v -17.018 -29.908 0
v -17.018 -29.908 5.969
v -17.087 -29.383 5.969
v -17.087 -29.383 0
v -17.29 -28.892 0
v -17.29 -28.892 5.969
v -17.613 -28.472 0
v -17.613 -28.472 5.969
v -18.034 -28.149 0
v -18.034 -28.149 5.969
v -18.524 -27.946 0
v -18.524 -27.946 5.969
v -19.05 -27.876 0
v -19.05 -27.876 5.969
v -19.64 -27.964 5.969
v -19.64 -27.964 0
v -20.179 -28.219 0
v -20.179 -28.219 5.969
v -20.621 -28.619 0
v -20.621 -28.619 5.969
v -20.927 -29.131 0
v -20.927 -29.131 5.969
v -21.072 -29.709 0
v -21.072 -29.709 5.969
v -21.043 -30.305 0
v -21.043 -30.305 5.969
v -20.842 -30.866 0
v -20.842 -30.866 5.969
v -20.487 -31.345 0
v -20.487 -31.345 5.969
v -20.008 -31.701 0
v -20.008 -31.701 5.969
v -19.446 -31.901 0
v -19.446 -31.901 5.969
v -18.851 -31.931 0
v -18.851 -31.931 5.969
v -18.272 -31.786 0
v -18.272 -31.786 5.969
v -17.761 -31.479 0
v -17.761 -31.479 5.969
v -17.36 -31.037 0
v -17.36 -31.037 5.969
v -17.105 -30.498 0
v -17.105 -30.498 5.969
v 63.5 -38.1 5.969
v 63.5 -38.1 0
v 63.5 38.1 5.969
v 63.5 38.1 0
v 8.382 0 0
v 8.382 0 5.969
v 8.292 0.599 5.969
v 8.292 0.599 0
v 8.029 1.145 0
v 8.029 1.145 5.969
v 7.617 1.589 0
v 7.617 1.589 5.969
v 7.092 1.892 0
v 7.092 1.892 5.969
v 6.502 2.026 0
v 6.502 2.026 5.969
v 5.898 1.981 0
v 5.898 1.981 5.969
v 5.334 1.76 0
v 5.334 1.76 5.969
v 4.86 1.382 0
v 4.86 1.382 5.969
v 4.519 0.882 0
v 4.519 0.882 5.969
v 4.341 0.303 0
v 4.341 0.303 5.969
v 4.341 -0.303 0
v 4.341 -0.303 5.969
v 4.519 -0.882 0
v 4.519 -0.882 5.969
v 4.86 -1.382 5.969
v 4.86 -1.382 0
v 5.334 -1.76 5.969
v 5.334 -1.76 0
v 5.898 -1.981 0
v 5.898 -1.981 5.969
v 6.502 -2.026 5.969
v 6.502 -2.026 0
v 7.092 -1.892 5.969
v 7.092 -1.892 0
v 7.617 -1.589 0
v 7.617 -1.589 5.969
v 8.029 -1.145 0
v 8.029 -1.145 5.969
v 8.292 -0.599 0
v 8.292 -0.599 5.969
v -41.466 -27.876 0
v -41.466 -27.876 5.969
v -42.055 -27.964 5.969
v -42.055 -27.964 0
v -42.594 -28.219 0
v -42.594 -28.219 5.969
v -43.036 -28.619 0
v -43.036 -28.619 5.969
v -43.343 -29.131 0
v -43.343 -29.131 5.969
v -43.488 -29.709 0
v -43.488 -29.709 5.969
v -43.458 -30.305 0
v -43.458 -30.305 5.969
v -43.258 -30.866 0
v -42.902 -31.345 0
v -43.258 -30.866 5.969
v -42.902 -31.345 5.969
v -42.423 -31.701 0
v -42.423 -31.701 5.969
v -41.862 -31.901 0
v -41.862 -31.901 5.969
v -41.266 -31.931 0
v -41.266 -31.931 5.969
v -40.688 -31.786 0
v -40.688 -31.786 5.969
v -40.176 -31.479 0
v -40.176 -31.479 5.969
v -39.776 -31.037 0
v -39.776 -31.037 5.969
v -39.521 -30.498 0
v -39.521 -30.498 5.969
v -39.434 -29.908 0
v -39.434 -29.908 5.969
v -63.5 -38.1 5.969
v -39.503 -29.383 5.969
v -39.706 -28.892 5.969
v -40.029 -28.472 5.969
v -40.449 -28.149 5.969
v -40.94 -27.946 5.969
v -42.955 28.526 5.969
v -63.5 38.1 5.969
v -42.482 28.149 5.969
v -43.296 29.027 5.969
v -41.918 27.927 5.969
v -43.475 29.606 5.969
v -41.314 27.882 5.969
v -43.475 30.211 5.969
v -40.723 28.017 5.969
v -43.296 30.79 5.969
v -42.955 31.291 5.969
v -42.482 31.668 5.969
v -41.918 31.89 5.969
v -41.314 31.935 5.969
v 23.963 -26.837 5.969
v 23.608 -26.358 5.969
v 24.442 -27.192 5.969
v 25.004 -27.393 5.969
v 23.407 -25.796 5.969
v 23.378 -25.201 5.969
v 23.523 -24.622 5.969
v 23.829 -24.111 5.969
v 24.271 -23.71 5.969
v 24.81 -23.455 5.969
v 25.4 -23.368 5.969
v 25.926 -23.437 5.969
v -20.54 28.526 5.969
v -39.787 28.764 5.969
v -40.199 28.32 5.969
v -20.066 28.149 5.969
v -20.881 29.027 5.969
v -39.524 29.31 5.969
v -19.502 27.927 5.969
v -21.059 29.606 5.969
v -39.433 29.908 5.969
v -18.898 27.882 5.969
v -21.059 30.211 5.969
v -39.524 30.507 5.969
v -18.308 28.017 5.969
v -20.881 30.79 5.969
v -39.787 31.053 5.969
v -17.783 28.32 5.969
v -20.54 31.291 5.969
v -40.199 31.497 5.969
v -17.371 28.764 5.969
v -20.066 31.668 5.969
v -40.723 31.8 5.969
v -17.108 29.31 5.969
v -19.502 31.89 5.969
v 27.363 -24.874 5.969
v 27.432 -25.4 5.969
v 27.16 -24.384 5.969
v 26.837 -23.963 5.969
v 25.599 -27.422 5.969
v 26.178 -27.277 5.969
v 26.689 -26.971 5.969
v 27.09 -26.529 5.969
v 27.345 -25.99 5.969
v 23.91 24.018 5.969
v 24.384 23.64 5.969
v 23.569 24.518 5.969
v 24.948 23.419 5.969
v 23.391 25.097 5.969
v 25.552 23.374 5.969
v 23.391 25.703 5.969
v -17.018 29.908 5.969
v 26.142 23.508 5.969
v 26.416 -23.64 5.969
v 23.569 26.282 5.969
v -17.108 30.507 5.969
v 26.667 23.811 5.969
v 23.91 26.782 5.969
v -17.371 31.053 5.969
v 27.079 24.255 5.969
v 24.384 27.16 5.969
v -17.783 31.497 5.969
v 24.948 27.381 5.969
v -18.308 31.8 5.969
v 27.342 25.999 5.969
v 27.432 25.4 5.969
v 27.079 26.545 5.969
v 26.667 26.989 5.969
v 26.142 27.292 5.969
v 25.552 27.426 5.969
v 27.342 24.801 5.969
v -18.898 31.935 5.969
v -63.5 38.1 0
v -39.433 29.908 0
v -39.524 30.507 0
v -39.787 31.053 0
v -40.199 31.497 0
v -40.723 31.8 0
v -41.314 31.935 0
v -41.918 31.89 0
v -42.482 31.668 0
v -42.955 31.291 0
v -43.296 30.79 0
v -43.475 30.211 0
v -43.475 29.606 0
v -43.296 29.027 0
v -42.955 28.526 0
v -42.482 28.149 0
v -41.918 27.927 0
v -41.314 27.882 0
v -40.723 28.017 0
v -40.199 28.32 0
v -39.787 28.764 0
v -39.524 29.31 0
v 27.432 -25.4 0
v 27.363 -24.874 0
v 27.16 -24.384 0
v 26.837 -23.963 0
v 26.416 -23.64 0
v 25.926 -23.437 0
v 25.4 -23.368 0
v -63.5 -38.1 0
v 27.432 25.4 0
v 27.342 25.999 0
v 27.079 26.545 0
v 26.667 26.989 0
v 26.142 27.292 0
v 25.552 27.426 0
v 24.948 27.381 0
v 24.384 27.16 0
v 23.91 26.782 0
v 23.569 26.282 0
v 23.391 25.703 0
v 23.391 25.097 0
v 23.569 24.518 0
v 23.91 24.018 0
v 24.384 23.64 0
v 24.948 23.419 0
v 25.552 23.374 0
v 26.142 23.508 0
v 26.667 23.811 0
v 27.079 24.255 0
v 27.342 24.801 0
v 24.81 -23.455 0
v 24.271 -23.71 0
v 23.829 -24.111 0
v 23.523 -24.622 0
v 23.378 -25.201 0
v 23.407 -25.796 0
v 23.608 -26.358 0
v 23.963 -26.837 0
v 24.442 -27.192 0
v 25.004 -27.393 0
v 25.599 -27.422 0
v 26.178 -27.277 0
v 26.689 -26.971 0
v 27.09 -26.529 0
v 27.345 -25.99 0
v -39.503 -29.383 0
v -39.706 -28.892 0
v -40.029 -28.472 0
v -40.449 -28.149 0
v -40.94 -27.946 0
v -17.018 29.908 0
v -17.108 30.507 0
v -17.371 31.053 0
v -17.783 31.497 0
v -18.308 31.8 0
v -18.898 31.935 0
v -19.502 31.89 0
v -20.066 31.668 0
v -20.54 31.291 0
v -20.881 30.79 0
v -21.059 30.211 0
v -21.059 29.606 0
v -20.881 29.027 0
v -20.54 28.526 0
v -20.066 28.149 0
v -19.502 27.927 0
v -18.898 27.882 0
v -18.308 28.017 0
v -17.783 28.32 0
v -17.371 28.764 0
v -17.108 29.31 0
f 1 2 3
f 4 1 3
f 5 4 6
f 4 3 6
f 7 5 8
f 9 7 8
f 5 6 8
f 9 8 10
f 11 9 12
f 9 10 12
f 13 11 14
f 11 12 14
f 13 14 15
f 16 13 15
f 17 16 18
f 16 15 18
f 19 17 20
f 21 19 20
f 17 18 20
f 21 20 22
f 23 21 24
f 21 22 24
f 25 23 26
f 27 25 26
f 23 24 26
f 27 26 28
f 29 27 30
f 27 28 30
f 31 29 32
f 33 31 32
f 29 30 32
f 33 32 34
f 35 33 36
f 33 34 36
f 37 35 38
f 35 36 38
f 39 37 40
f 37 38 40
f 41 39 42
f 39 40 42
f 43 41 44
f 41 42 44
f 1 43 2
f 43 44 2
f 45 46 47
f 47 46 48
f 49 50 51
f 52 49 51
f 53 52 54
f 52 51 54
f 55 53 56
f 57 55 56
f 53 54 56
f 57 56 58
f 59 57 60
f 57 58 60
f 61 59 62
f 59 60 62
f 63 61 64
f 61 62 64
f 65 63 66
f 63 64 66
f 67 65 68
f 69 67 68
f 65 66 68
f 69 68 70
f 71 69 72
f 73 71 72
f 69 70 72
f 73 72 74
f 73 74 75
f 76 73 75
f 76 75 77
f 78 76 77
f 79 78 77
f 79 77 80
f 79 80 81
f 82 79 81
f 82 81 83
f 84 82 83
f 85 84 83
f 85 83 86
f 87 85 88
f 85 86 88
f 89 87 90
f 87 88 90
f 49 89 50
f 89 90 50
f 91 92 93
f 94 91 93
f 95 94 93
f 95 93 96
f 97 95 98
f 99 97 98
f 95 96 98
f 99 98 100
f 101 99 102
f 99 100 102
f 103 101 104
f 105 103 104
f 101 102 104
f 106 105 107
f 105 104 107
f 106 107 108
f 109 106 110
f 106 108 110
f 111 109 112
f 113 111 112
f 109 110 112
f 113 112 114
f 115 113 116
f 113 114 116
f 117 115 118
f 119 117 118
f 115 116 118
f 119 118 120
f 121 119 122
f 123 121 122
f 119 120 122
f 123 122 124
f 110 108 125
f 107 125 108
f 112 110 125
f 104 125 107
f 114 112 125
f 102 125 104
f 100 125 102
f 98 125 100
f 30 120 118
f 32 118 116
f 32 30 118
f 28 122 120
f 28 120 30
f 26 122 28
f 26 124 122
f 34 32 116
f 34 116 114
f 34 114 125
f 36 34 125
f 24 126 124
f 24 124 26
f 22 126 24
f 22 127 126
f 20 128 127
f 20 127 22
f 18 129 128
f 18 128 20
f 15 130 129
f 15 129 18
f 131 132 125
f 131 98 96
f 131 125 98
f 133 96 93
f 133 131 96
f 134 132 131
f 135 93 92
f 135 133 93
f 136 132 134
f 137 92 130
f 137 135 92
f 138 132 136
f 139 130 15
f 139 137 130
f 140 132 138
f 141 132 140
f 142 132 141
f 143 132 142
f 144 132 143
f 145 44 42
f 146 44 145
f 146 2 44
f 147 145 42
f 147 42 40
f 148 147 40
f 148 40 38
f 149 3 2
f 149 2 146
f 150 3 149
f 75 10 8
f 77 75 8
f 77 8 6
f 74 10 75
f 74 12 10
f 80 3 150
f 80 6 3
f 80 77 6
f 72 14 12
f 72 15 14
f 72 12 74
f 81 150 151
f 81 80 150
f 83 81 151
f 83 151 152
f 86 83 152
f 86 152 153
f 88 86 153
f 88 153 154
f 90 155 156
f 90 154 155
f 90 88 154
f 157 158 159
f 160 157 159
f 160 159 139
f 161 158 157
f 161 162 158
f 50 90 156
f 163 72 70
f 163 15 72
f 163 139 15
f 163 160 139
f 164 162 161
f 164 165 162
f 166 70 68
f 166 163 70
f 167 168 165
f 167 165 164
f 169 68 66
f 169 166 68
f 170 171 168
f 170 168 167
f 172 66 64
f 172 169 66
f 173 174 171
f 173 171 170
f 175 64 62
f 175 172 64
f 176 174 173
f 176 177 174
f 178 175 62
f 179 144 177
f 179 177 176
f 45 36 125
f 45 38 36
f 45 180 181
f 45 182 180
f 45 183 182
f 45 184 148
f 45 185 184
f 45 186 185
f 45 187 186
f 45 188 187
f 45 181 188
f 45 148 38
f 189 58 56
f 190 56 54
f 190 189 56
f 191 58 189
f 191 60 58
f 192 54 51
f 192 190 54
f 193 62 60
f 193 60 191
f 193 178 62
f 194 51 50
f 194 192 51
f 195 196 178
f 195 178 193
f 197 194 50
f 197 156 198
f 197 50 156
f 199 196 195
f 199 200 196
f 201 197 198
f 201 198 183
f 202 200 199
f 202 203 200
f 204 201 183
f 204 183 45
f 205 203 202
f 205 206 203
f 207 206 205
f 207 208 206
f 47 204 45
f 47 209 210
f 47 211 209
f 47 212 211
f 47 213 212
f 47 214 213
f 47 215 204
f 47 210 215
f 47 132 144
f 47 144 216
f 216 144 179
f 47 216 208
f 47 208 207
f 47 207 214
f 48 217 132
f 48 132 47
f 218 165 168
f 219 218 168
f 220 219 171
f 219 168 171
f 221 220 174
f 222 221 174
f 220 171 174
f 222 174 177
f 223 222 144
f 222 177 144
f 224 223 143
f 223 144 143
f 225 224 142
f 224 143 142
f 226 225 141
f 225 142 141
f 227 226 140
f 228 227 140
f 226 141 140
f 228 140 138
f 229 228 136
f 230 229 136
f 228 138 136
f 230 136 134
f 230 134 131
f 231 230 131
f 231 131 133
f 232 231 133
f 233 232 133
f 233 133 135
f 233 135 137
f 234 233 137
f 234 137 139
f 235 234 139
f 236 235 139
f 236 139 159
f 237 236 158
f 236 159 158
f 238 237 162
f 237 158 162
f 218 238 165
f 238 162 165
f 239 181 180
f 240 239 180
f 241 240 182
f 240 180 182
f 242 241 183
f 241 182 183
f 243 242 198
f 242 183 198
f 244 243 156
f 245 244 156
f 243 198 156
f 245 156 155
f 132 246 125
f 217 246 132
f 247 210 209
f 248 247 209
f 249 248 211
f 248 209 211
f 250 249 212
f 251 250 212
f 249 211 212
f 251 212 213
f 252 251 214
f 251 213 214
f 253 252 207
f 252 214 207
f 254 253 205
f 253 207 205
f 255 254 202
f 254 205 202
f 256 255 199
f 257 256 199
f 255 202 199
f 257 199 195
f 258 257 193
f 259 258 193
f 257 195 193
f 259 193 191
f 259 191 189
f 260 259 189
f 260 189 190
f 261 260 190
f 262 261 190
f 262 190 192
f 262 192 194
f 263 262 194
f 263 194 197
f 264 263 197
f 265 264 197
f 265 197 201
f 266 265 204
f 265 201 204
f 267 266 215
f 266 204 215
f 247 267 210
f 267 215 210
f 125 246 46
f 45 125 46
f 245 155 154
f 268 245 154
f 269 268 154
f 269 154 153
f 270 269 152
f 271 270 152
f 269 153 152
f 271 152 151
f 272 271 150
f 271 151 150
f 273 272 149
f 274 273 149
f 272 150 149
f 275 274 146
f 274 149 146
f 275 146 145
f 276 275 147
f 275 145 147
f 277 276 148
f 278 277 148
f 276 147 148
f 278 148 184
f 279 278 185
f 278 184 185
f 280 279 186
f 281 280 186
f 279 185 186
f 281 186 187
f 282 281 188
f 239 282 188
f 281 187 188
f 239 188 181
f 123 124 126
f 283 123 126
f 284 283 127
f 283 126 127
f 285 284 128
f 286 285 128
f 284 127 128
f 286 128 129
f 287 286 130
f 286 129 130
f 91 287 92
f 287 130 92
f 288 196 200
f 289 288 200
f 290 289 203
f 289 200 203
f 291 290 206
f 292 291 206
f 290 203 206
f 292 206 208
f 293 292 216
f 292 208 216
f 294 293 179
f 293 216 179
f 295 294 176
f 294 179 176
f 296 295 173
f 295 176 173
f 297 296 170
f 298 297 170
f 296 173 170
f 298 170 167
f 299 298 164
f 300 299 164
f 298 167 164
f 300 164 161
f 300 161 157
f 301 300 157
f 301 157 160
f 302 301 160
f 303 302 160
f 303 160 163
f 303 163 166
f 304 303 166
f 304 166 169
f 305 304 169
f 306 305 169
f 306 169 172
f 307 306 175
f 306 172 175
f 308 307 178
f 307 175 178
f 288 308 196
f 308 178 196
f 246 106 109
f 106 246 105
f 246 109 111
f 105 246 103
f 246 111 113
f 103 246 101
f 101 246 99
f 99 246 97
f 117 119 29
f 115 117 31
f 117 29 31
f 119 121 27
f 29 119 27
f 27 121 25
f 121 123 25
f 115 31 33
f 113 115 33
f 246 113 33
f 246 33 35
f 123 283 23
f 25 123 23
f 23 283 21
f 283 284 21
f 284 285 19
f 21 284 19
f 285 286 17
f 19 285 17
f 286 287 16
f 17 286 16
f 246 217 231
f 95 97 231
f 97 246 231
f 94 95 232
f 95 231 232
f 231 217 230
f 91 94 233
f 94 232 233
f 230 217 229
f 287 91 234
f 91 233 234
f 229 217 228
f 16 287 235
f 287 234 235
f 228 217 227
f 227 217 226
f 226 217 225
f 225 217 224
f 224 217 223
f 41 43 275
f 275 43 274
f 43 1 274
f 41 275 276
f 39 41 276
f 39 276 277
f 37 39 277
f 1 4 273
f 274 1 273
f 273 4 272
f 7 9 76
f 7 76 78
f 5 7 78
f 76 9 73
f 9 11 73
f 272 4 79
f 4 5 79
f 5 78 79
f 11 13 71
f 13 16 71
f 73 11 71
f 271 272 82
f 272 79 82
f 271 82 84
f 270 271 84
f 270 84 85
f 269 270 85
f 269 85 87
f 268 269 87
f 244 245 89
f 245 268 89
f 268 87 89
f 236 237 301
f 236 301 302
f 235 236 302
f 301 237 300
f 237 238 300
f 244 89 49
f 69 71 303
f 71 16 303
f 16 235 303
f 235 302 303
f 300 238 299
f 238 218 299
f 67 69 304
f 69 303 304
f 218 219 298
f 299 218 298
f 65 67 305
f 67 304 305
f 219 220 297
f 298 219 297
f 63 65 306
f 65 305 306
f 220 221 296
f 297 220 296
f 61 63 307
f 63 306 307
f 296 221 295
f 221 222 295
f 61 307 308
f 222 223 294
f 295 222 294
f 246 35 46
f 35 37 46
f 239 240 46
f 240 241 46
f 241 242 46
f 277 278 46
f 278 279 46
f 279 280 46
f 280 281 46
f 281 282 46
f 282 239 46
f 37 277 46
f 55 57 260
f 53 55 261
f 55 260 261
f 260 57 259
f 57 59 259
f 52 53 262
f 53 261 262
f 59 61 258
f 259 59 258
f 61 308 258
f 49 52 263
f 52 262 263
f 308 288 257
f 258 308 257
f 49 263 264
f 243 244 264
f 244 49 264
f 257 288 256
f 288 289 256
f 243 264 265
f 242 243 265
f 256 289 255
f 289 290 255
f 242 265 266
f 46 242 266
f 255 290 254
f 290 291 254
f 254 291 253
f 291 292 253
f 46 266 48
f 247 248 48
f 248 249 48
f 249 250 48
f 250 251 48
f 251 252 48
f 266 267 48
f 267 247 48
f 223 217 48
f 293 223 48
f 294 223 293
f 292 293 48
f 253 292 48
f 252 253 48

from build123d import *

# Parameters (mm, degrees)
F0_W     = 127
F0_H     = 76.2
F2_DEPTH = 5.969
F3_R     = 2.032
F4_DEPTH = 5.969


# Not quite as in the source:
# - a variable given as a bare number and used for a length is read in inches; the dataset says mm whatever the document's units were


with BuildPart() as f2:
    # F0 (on Top) → F2 (new body)
    with BuildSketch(Plane.XY):
        Rectangle(F0_W, F0_H)
    extrude(amount=F2_DEPTH)

    # F3 (on face) → F4 (cut, through all)
    with BuildSketch(Plane.XY.offset(5.969)):
        with BuildLine():
            ThreePointArc((-39.4335, -29.9085), (-40.0286590206, -28.4716590206), (-41.4655, -27.8765))
            ThreePointArc((-41.4655, -27.8765), (-42.9023409794, -31.3453409794), (-39.4335, -29.9085))
        make_face()
        with BuildLine():
            ThreePointArc((-17.018, -29.9085), (-17.6131590206, -28.4716590206), (-19.05, -27.8765))
            ThreePointArc((-19.05, -27.8765), (-20.4868409794, -31.3453409794), (-17.018, -29.9085))
        make_face()
        with BuildLine():
            Line((6.35, 0), (4.318, 0))
            ThreePointArc((4.318, 0), (6.35, -2.032), (8.382, 0))
            Line((8.382, 0), (6.35, 0))
        make_face()
        with BuildLine():
            ThreePointArc((8.382, 0), (6.35, 2.032), (4.318, 0))
            Line((4.318, 0), (6.35, 0))
            Line((6.35, 0), (8.382, 0))
        make_face()
        with BuildLine():
            ThreePointArc((27.432, -25.4), (26.8368409794, -23.9631590206), (25.4, -23.368))
            ThreePointArc((25.4, -23.368), (23.9631590206, -26.8368409794), (27.432, -25.4))
        make_face()
        with Locations((-41.4655, 29.9085)):
            Circle(F3_R)
        with Locations((-19.05, 29.9085)):
            Circle(F3_R)
        with Locations((25.4, 25.4)):
            Circle(F3_R)
    extrude(amount=-F4_DEPTH, mode=Mode.SUBTRACT)


solid = f2.part
